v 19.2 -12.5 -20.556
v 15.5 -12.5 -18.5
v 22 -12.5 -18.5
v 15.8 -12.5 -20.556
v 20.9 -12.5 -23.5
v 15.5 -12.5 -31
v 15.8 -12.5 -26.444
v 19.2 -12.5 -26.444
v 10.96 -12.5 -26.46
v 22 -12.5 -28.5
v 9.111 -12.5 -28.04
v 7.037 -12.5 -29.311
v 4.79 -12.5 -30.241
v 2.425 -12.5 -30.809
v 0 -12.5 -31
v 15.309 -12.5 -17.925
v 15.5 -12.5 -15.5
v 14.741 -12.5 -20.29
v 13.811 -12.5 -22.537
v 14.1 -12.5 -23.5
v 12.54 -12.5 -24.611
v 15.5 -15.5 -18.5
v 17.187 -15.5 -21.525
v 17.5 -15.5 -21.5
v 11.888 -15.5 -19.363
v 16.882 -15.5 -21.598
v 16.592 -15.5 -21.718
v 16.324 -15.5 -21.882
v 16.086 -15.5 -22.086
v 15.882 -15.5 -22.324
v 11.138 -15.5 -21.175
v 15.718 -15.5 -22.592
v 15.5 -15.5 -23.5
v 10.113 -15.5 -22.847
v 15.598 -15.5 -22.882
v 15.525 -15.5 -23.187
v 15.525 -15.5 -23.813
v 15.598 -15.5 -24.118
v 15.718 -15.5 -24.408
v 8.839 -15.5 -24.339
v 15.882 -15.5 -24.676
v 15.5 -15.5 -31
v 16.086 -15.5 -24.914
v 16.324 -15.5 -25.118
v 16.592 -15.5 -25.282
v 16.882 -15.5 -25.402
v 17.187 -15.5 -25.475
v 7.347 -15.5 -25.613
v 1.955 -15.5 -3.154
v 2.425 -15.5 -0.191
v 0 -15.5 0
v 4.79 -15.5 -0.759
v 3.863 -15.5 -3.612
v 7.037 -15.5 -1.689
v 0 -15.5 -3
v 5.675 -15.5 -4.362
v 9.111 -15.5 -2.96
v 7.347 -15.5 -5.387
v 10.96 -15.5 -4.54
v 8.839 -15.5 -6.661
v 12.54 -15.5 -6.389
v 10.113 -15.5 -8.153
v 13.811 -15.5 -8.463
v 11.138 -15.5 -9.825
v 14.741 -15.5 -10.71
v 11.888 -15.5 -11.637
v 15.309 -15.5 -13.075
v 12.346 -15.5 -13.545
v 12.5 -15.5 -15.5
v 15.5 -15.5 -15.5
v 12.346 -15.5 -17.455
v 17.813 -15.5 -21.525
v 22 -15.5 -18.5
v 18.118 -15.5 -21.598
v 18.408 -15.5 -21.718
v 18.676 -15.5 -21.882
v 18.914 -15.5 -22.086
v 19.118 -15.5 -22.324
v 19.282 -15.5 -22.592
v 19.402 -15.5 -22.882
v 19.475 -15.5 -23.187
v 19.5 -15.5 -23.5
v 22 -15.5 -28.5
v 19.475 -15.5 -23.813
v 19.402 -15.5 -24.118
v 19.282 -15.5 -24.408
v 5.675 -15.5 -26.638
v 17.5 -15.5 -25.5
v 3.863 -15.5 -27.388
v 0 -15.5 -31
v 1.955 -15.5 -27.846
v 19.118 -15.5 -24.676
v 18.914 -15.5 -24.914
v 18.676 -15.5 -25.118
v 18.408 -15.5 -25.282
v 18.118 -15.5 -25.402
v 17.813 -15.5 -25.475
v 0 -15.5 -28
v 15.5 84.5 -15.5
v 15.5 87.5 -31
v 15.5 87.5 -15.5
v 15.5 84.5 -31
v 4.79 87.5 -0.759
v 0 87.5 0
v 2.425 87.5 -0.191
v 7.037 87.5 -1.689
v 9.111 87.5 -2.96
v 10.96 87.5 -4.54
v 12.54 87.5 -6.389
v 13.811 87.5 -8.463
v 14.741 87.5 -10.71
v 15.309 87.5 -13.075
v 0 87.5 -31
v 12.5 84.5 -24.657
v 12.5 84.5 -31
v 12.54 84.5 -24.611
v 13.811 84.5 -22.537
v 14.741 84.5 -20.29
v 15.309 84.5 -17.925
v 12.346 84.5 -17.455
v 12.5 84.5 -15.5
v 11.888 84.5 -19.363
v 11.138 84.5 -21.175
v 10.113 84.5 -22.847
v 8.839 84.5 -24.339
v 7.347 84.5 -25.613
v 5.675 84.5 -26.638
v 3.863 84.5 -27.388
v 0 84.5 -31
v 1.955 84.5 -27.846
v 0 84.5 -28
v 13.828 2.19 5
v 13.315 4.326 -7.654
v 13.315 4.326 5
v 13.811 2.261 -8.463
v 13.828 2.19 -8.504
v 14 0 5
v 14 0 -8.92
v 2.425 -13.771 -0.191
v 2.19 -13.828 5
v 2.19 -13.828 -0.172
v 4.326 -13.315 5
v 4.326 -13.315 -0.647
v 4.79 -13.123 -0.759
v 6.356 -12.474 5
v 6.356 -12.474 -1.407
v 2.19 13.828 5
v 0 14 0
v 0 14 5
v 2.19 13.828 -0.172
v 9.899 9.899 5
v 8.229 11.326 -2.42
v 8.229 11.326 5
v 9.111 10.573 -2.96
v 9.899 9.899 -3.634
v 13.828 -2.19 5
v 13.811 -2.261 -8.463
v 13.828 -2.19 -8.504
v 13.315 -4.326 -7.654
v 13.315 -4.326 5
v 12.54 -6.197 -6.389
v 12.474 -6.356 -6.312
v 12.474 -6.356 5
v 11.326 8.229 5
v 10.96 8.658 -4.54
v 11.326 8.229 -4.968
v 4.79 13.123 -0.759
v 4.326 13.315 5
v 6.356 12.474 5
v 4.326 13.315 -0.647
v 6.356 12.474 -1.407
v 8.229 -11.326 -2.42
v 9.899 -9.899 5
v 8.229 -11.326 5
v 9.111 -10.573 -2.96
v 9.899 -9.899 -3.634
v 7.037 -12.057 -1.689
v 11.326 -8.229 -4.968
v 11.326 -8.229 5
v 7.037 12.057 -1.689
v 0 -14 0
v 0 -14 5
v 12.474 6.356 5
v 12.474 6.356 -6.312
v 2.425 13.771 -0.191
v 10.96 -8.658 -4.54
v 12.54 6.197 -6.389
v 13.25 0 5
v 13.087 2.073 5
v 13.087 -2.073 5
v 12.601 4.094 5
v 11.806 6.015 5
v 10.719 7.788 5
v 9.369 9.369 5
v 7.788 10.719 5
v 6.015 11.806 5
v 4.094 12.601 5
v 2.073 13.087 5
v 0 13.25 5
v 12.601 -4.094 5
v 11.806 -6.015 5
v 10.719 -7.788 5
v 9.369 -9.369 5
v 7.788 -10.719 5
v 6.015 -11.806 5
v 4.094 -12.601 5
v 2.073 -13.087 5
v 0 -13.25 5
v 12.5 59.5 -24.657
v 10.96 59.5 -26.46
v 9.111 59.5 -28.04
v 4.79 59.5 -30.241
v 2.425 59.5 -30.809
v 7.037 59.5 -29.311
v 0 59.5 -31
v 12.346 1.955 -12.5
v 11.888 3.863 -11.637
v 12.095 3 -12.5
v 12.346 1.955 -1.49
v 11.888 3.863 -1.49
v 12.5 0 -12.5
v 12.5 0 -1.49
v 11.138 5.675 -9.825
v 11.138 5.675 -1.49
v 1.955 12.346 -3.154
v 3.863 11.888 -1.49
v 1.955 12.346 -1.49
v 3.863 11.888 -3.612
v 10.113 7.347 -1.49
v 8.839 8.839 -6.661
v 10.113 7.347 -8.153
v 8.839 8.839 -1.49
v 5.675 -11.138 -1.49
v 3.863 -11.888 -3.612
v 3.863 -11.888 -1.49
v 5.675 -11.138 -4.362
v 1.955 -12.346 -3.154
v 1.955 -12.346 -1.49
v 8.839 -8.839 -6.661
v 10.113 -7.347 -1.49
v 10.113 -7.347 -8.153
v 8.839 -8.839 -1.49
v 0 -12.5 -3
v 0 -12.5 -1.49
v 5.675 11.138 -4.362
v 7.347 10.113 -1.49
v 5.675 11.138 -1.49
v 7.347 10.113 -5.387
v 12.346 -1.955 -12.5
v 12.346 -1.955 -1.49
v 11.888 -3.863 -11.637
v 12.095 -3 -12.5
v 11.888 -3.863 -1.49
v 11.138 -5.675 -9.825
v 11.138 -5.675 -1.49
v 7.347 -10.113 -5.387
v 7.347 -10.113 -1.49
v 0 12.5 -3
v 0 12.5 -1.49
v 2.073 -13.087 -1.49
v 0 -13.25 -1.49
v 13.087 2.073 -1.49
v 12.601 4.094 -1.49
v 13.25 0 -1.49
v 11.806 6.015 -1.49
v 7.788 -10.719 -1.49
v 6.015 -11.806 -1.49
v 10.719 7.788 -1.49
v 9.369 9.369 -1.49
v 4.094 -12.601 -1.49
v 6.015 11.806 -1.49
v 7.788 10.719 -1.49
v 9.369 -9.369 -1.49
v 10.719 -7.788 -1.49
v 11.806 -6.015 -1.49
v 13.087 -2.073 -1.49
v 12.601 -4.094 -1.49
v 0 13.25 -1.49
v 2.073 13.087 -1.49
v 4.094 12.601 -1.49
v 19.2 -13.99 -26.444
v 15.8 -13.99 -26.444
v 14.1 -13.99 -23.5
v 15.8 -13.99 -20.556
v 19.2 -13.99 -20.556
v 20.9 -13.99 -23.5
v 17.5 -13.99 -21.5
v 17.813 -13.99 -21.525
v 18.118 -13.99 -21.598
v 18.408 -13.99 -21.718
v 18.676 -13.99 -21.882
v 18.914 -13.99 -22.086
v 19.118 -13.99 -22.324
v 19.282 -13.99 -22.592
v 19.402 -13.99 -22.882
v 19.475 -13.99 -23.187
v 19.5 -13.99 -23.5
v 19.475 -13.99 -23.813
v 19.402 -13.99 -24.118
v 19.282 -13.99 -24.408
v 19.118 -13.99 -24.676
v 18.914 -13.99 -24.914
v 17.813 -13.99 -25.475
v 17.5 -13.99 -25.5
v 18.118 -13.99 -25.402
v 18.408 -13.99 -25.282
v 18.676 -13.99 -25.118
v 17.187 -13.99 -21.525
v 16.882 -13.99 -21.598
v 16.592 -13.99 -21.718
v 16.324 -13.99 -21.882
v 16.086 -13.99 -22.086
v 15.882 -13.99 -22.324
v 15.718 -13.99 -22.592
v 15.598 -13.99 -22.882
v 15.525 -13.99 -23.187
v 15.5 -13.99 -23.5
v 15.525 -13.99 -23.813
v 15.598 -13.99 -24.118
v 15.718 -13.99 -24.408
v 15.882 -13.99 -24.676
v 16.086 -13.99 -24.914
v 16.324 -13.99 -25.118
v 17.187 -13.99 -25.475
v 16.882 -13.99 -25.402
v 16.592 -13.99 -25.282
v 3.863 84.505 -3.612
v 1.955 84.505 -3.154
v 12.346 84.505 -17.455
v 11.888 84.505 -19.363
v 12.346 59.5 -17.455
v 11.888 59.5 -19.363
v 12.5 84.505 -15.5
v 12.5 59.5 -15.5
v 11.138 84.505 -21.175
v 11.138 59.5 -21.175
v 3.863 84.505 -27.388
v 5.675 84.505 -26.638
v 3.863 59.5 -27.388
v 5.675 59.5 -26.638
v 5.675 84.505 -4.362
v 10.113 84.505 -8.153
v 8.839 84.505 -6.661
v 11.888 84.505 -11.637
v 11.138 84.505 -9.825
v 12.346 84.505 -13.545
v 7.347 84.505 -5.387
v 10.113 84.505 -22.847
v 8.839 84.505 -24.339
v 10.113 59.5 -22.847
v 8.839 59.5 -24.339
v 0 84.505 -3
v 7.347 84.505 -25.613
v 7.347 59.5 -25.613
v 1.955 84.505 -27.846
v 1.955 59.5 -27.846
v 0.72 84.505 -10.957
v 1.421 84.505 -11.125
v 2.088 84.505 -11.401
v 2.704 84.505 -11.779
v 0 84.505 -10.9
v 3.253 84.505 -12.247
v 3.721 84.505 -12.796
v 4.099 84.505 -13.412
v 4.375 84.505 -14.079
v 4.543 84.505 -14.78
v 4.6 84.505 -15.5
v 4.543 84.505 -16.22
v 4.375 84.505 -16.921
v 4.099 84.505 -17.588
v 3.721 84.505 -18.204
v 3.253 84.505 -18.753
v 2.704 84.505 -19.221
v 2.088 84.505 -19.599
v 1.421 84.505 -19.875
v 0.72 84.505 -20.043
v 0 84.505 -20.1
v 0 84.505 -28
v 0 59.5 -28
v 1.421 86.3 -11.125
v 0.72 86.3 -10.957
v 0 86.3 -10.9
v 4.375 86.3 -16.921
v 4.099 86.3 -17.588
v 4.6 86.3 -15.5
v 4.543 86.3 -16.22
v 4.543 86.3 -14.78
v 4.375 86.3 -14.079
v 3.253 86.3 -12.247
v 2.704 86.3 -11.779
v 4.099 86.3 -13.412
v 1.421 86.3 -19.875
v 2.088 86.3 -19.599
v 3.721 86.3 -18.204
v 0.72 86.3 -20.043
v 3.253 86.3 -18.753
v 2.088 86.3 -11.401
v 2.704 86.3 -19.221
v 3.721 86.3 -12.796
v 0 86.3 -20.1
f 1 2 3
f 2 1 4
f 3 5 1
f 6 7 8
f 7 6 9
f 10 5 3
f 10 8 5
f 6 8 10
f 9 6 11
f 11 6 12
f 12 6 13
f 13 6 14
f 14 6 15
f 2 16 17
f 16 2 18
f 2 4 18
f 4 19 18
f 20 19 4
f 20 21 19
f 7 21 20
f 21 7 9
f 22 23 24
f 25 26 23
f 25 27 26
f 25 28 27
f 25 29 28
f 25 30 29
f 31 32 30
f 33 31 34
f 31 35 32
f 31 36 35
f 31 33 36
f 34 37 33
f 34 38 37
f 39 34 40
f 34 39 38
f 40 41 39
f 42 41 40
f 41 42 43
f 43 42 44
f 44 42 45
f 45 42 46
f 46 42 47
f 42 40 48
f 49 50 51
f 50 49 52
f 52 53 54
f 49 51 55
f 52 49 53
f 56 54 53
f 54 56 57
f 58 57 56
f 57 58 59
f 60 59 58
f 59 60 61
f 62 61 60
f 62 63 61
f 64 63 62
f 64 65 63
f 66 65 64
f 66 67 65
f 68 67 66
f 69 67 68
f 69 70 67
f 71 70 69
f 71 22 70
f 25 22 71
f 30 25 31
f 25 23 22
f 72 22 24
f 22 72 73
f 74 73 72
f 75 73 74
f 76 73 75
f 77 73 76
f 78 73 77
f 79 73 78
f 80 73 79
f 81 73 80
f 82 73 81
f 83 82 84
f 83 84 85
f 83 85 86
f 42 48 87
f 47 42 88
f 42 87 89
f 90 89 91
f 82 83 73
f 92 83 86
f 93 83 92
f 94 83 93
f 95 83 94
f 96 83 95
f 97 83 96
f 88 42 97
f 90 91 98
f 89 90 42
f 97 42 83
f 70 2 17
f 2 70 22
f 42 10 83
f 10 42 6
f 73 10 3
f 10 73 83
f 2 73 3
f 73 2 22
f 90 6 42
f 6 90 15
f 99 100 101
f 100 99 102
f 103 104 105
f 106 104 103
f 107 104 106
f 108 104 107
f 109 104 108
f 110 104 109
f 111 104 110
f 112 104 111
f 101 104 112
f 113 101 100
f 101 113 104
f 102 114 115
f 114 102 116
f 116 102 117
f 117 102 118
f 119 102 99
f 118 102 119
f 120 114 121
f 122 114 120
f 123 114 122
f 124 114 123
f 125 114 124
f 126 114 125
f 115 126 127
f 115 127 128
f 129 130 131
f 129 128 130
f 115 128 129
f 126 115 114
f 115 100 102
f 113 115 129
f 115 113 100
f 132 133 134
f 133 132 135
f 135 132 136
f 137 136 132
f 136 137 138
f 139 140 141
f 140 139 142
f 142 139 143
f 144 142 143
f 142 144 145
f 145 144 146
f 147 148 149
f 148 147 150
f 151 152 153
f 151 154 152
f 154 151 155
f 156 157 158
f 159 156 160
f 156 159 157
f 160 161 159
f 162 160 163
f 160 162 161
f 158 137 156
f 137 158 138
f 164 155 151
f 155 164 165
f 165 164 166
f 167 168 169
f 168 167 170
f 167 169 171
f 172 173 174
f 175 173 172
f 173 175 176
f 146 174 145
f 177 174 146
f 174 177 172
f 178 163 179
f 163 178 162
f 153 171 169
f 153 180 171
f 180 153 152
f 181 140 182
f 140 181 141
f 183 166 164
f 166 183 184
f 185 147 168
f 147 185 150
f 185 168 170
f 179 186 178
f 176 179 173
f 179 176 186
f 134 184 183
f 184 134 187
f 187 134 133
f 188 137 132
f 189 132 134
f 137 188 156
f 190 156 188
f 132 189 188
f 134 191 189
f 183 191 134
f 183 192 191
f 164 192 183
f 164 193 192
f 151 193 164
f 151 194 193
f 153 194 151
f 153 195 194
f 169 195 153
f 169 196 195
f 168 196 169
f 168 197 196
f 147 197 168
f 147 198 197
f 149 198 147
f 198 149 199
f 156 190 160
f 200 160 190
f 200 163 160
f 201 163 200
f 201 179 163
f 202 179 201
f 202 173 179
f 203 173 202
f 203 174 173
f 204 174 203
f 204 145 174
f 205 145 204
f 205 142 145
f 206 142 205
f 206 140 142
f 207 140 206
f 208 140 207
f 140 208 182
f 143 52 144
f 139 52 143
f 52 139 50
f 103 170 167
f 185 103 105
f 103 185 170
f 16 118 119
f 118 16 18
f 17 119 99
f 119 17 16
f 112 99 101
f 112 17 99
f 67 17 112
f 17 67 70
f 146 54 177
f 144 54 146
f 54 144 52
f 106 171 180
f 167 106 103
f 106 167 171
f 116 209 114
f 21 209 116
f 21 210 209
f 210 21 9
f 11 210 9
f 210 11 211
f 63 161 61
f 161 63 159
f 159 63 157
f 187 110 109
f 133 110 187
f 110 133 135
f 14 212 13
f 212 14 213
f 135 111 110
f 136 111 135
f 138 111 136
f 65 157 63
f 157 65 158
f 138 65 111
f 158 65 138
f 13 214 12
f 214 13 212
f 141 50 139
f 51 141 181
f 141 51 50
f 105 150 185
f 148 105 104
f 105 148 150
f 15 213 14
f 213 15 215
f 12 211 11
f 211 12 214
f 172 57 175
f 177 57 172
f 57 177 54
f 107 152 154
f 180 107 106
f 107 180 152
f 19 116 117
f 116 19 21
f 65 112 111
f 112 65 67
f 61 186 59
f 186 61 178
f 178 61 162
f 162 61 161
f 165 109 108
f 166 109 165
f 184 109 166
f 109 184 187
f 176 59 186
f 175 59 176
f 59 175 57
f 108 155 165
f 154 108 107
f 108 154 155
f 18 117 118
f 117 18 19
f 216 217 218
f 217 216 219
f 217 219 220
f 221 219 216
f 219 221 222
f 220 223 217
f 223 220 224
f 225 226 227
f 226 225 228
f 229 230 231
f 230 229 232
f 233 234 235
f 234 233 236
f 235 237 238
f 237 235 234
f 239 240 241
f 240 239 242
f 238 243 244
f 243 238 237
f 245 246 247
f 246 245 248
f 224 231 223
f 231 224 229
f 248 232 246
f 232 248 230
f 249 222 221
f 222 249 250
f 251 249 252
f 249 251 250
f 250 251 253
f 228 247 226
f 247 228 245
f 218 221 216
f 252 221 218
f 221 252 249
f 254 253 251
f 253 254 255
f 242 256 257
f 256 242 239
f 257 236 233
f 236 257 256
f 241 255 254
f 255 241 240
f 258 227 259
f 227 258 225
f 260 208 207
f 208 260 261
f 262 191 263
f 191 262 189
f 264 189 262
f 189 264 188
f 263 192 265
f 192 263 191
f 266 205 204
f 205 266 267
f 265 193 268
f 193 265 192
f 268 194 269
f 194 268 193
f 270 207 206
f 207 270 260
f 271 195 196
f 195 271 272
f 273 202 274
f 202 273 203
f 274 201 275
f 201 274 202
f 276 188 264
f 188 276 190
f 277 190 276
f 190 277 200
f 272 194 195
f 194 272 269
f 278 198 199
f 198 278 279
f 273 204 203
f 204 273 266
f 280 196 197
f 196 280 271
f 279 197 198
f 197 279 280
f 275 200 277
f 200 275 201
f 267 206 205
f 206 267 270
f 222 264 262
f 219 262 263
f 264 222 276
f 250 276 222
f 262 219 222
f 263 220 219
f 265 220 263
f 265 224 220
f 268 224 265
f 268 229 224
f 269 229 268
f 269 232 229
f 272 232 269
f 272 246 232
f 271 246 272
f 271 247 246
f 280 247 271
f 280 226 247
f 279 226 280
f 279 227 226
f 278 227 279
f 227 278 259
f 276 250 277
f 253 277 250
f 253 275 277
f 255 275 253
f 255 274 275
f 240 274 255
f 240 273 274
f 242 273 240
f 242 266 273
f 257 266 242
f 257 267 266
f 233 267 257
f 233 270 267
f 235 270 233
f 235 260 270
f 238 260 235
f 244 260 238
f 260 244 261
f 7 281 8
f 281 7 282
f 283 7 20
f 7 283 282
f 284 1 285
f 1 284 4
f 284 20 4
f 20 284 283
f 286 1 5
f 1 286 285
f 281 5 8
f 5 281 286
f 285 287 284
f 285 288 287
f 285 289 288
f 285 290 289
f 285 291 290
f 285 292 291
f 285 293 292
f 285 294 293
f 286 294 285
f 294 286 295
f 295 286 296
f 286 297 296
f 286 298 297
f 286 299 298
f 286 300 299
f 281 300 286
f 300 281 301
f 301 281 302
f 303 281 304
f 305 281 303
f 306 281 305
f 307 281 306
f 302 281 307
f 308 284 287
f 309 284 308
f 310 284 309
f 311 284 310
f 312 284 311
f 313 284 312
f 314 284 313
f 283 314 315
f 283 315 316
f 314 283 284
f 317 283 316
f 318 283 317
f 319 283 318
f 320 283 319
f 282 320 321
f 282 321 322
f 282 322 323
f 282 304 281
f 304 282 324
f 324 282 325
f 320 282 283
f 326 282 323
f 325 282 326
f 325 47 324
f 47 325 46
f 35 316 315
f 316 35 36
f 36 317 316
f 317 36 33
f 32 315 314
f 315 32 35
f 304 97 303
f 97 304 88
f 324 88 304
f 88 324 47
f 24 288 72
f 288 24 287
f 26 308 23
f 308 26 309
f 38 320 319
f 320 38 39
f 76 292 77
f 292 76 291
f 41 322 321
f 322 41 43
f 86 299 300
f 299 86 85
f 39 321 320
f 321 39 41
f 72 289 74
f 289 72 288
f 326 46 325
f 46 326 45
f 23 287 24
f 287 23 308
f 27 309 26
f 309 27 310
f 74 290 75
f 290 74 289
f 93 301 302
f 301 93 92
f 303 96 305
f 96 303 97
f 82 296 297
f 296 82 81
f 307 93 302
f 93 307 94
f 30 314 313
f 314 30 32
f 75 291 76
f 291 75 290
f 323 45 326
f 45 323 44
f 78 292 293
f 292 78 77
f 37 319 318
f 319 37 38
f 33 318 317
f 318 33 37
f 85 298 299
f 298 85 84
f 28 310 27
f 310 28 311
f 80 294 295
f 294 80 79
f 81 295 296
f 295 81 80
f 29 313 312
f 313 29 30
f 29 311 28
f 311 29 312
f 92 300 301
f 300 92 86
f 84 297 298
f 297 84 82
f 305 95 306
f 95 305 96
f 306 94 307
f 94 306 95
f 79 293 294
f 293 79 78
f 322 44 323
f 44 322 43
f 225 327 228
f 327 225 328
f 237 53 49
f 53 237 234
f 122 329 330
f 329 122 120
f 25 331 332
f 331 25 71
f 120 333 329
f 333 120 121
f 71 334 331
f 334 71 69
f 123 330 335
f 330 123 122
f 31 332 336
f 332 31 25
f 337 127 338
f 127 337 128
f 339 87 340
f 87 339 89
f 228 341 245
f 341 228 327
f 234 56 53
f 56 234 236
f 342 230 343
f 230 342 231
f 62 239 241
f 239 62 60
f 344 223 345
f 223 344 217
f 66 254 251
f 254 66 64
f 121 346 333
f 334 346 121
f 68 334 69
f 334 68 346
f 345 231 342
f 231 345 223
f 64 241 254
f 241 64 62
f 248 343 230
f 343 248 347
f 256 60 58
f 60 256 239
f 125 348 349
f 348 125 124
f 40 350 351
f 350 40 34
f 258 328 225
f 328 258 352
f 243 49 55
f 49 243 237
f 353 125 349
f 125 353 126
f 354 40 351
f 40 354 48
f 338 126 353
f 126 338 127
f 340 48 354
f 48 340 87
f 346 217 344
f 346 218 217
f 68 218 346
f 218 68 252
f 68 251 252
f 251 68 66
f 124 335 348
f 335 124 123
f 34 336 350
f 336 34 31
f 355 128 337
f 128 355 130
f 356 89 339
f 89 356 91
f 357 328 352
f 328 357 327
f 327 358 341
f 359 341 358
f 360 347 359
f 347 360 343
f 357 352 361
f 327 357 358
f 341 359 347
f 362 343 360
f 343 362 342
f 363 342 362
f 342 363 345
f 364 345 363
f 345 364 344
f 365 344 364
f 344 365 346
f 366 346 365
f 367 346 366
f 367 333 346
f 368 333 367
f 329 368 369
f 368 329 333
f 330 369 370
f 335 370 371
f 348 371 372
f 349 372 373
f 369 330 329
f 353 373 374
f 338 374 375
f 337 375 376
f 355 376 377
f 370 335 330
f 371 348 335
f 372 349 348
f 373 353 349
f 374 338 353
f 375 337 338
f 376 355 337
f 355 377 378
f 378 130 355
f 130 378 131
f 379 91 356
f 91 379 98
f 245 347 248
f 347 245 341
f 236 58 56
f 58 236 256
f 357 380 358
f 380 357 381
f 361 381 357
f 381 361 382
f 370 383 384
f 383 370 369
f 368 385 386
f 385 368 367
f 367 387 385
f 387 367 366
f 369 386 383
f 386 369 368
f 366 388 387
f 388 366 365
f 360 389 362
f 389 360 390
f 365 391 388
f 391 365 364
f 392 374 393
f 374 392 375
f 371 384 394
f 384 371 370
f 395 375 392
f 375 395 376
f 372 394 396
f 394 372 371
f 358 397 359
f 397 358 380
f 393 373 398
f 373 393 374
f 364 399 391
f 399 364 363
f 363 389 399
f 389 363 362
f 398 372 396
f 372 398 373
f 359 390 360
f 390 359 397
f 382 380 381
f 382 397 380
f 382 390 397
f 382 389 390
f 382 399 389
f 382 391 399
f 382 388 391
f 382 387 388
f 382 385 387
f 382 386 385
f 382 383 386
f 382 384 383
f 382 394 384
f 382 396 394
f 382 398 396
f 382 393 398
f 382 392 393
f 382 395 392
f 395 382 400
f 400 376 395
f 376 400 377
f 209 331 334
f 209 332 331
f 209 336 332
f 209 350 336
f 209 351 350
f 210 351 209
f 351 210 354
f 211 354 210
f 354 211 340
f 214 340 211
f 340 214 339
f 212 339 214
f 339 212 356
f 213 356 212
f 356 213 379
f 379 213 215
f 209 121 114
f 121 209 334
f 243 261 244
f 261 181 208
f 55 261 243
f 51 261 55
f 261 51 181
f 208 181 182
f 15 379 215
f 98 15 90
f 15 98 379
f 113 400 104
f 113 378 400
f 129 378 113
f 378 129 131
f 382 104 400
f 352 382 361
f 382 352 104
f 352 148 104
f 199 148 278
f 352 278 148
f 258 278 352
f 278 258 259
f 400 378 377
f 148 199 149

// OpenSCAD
// file: stepper2b.scad
//$fa = 1;
//$fs = 0.4;
//$fn = 200;

function stepper2b_pinOffset() = [0, 8, 0];

function stepper2b_pinDiam() = 5;

module stepper2b_pin()
{
	color("#c1a15e")
	{
		linear_extrude(10-6)
		circle(d=5);

		intersection()
		{
			linear_extrude(10)
			circle(d=stepper2b_pinDiam());
			
			translate([0, 0, 10-6+6/2])  cube([10, 3, 6], center=true);
		}
	}
}

module stepper2b_mountingPlate(holes=true)
{
	difference()
	{
		translate([0, 0, -1])
		linear_extrude(1)
		for(i=[-1, 1])
		{
			union()
			{
				translate([35/4*i, 0]) square([35/2, 7], center=true);
				translate([35/2*i, 0]) circle(d=7);
			}
		}
		
		if(holes)
		{
			stepper2b_mountingHole();
		}
	}
}

module stepper2b_mountingHole()
{
	translate([0, 0, -1.01])
	linear_extrude(1.02)
	for(i=[-1, 1])
	{
		translate([35/2*i, 0]) circle(d=4);
	}
}

module stepper2b()
{
	translate([0, 0, -19])
	linear_extrude(19)
	circle(d=28);
	
	stepper2b_mountingPlate();
	
	linear_extrude(1.5)
	translate([0, 8]) circle(d=9);
	
	translate([0, -17/2+1.5/2, -16.5])
	linear_extrude(16.5)
	square([14.6-2, 17-1.5], center=true);
	
	translate(stepper2b_pinOffset())
	rotate([0, 0, $t*360])
	stepper2b_pin();
	
	color("#5399cc")
	difference()
	{
		translate([0, -17/2, -16.5-0.01])
		linear_extrude(16.5)
		square([14.6, 17], center=true);
		
		translate([0, -17, -2.5])
		linear_extrude(1.5)
		square([6.5, 2], center=true);
	}
	
	color("#5399cc")
	translate([0, -17, -16])
	linear_extrude(12.75)
	for(i=[-1, 1])
	{
		translate([i*14.6/2, 5.06])
		scale([i, 1])
		difference()
		{
			polygon([[0,0], [0,-1.5],[1.5,-1], [1.5, 2]]);
		}
	}
}

stepper2b();
// file: auger.scad
module auger(height, diameter, centerDiameter, turns, thickness)
{
	cylinder(h=height, r=centerDiameter);
	
	linear_extrude(height=height, twist=turns*360) union()
	{	
		rectSize = diameter/2 - thickness/2;
		translate([rectSize / 2, 0]) square([rectSize, thickness], true);
		translate([rectSize, 0, 0]) circle(r=thickness/2);
	}
}


Height=100;
Turns=6;
Diam=25;
Thick=5;
Center=4;

auger(Height, Diam, Center, Turns, Thick);
// file: funnel_box.scad
height=100;
diameter=200;
hole=25;
wall=3;
tunnelHeight=200;
containerCircle=false;
tunnelCircle=false;

module funnelBox_impl(height, diameter, 
					   hole, tunnelHeight,
					   containerCircle, tunnelCircle)
{
	linear_extrude(height, scale=diameter/hole)
	{
		if(containerCircle)
		{
			circle(d=hole);
		}
		else
		{
			square(hole,center=true);
		}
	}
	
	translate([0,0,-tunnelHeight])linear_extrude(tunnelHeight + 1) 
	{	
		if(tunnelCircle)
		{
			circle(d=hole);
		}
		else
		{
			square(hole,center=true);
		}
	}
}

module funnelBoxInside(height, diameter, 
					   hole, wall, tunnelHeight,
					   containerCircle=false, tunnelCircle=false)
{			   
	funnelBox_impl(height+0.01, diameter, hole, tunnelHeight+0.01, containerCircle, tunnelCircle);
}

module funnelBoxOutside(height, diameter, 
					   hole, wall, tunnelHeight,
					   containerCircle=false, tunnelCircle=false)
{			   
	holeWall = hole + wall*2;
	diameterWall = diameter + wall*2;
	
	funnelBox_impl(height, diameterWall, holeWall, tunnelHeight, containerCircle, tunnelCircle);
}

module funnelBox(height, diameter, hole, wall, tunnelHeight,
				 containerCircle=false, tunnelCircle=false)
{
	difference()
	{
		funnelBoxOutside(height, diameter, hole, wall, tunnelHeight, containerCircle, tunnelCircle);
		
		funnelBoxInside(height, diameter, hole, wall, tunnelHeight, containerCircle, tunnelCircle);
		
	}
}

funnelBox(height,
diameter,
hole,
wall,
tunnelHeight,
containerCircle,
tunnelCircle);
// file: utils.scad
module pipeOutside(diameter, wall, length)
{
	cylinder(length, d=diameter+wall*2, center=true);
}

module pipeInside(diameter, wall, length)
{
	cylinder(length+0.01, d=diameter, center=true);
}

module pipe(diameter, wall, length)
{
	difference()
	{
		pipeOutside(diameter, wall, length);
		pipeInside(diameter, wall, length);
	}
}

module crossSection(angle=0)
{
	intersection()
	{
		children();
		
		rotate([0, 0, angle]) translate([1000/2, 0, 0]) 
		linear_extrude(1000, center=true) square(1000, center=true);
	}
}

module mirrorAdd(axis)
{
	children();
	mirror(axis) children();
}
// main file
$fa = 1;
$fs = 0.5;
$fn = 40;

$to = 0.3;

use <utils.scad>
use <funnel_box.scad>
use <auger.scad>
use <stepper2b.scad>

coneHeight = 75;
coneDiameter = 150;
coneHoleDiam = 25;

boxCircle = true;
funnelCircle = true;

pipeDiameter = 25;
pipeWall = 3;
pipeLen = 100;

pipeTrans = 
[
	0, 
	pipeLen/2 - coneHoleDiam/2 - pipeWall, 
	-pipeDiameter/2 - pipeWall
];

pipeRot = 
[
	-90, 
	0,
	0
];

module pipeTransform()
{
	translate(pipeTrans) rotate(pipeRot) children();
}

module stepperTransform()
{
	pipeTransform()
	rotate([0, 0, 180]) 
	translate([0, 0, -pipeLen / 2])
	translate([0,-8,-1.5])
	children();
}

screwHeight=pipeLen;
screwTurns=6;
screwDiam=pipeDiameter-$to*2;
screwThick=5;
screwCenter=4;
screwTerm=pipeWall;

heightAbovePipe = 5;
adapterHeight = heightAbovePipe+pipeDiameter/2;
insertSlotHeight = 6.5;

module augerDispenser()
{
	difference()
	{
		union()
		{
            translate([0,0,-pipeDiameter/2])
            cylinder(r=coneHoleDiam/2 + 1.5, h=adapterHeight);
            
            outside = coneHoleDiam+pipeWall;
            *translate([0,-outside/4-pipeWall/2,-adapterHeight/2 + heightAbovePipe])
            cube([outside/4,outside/2,adapterHeight], center=true);
            
			*funnelBoxOutside(coneHeight,
			coneDiameter,
			coneHoleDiam,
			pipeWall,
			coneHoleDiam/2+pipeWall,
			boxCircle,
			funnelCircle);
			
			pipeTransform()
			{
				pipeOutside(pipeDiameter, pipeWall, pipeLen);
			}

            //Screw plate
			translate([0,pipeWall])
			stepperTransform()
            {
                plateOffset = 6.5;
                plateL = pipeDiameter+pipeWall*2+plateOffset*2;
                
                cube([plateL,10,pipeWall],true);
                
                mirrorAdd([1,0])
                translate([plateL/2-6.5,-10/2])
                rotate([180,0,0])
                linear_extrude(pipeWall,center=true)
                polygon([[6.5, 0], [0,0], [0, 2.5]]);
                
                // Support Triangles
                /*
                mirrorAdd([1,0,0]) mirrorAdd([0,1,0])
                {
                    translate([0,10/2-pipeWall/4,-1])
                    rotate([90,90,0])
                    linear_extrude(pipeWall/2,center=true)
                    polygon([[plateL/2, 0], [0,0], [0, plateL/2]]);
                }
                */
            }
			
			pipeTransform()
			translate([0, 0, pipeLen / 2])
			cylinder(h=pipeWall, d=pipeDiameter+pipeWall*2);
            
			pipeTransform()
            for(i = [-1,1])
			translate([0, pipeDiameter/2+pipeWall-pipeDiameter/4-pipeWall/2, pipeLen/2 * i + pipeWall/2])
            {
                cube([pipeDiameter+pipeWall*2,pipeDiameter/2+pipeWall,pipeWall],true);
            }
		}
		
        union()
        {
            translate([0,0,-pipeDiameter/2])
            cylinder(r=coneHoleDiam/2, h=adapterHeight);
            translate([0,0,heightAbovePipe-insertSlotHeight+0.01])
            cylinder(r=coneHoleDiam/2+.75, h=insertSlotHeight);
        }
        
		*funnelBoxInside(coneHeight,
		coneDiameter,
		coneHoleDiam,
		pipeWall,
		coneHoleDiam/2+pipeWall,
		boxCircle,
		funnelCircle);
		
		pipeTransform()
		{
			pipeInside(pipeDiameter, pipeWall, pipeLen);
		}
			
		pipeTransform()
		translate([0, 0, pipeLen/2-pipeWall/2+$to])
		cylinder(h=pipeWall, r=screwCenter+$to*2);
			
		pipeTransform()
		translate([0, coneHoleDiam/2, pipeLen/2-coneHoleDiam/2])
		cube(coneHoleDiam, center=true);

        //Screw plate
        translate([0,pipeWall])
        stepperTransform()
        for(i=[-1, 1])
        {
            translate([35/2*i,0,+0.01]) cylinder(d=6.5+$to,h=pipeWall/2, $fn=6);
            translate([35/2*i,0,-pipeWall/2-0.01]) cylinder(d=4, h=pipeWall);
        }
    }

	module screw()
	{
		pipeTransform()
		translate([0, 0, -pipeLen / 2])
		difference()
		{
			union()
			{
				translate([$to,0])
				auger(screwHeight-pipeWall, screwDiam, screwCenter, screwTurns, screwThick);
				
				linear_extrude(screwTerm) circle(d=screwDiam);
			}
			
			minkowski()
			{
				translate([0,0,-2.01]) stepper2b_pin();
				cube($to, center=true);
			}
		}
		
		pipeTransform()
		translate([0, 0, pipeLen / 2 - pipeWall - $to])
		cylinder(h=pipeWall*1.5, r=screwCenter);
	}
	
	//translate([0,$to])
	//screw();
	
	module pipeCap()
	{
		difference()
		{
			union()
			{
				pipeTransform()
				translate([0, 0, -pipeLen/ 2])
				translate([0,0,-pipeWall/2]) 
				linear_extrude(pipeWall/2) circle(d=pipeDiameter+pipeWall*2);
					
				translate([0,1.5])
				stepperTransform()
				scale([1,1,1.5])
				stepper2b_mountingPlate();
			}
			
			pipeTransform()
			translate([0, 0, -pipeLen/ 2])
			translate([0,0,-pipeWall/2]) 
			translate([0, 0, -0.1])
			linear_extrude(pipeWall/2+0.2) circle(d=9+$to*2);
		}
	
	}
	
	//translate([0,-$to/2,0]) 
	//pipeCap();

	/*
	*/
	//stepperTransform()  
	//translate([0,0,-$to])
	//stepper2b();
}

crossSection()
{
    augerDispenser();
}
